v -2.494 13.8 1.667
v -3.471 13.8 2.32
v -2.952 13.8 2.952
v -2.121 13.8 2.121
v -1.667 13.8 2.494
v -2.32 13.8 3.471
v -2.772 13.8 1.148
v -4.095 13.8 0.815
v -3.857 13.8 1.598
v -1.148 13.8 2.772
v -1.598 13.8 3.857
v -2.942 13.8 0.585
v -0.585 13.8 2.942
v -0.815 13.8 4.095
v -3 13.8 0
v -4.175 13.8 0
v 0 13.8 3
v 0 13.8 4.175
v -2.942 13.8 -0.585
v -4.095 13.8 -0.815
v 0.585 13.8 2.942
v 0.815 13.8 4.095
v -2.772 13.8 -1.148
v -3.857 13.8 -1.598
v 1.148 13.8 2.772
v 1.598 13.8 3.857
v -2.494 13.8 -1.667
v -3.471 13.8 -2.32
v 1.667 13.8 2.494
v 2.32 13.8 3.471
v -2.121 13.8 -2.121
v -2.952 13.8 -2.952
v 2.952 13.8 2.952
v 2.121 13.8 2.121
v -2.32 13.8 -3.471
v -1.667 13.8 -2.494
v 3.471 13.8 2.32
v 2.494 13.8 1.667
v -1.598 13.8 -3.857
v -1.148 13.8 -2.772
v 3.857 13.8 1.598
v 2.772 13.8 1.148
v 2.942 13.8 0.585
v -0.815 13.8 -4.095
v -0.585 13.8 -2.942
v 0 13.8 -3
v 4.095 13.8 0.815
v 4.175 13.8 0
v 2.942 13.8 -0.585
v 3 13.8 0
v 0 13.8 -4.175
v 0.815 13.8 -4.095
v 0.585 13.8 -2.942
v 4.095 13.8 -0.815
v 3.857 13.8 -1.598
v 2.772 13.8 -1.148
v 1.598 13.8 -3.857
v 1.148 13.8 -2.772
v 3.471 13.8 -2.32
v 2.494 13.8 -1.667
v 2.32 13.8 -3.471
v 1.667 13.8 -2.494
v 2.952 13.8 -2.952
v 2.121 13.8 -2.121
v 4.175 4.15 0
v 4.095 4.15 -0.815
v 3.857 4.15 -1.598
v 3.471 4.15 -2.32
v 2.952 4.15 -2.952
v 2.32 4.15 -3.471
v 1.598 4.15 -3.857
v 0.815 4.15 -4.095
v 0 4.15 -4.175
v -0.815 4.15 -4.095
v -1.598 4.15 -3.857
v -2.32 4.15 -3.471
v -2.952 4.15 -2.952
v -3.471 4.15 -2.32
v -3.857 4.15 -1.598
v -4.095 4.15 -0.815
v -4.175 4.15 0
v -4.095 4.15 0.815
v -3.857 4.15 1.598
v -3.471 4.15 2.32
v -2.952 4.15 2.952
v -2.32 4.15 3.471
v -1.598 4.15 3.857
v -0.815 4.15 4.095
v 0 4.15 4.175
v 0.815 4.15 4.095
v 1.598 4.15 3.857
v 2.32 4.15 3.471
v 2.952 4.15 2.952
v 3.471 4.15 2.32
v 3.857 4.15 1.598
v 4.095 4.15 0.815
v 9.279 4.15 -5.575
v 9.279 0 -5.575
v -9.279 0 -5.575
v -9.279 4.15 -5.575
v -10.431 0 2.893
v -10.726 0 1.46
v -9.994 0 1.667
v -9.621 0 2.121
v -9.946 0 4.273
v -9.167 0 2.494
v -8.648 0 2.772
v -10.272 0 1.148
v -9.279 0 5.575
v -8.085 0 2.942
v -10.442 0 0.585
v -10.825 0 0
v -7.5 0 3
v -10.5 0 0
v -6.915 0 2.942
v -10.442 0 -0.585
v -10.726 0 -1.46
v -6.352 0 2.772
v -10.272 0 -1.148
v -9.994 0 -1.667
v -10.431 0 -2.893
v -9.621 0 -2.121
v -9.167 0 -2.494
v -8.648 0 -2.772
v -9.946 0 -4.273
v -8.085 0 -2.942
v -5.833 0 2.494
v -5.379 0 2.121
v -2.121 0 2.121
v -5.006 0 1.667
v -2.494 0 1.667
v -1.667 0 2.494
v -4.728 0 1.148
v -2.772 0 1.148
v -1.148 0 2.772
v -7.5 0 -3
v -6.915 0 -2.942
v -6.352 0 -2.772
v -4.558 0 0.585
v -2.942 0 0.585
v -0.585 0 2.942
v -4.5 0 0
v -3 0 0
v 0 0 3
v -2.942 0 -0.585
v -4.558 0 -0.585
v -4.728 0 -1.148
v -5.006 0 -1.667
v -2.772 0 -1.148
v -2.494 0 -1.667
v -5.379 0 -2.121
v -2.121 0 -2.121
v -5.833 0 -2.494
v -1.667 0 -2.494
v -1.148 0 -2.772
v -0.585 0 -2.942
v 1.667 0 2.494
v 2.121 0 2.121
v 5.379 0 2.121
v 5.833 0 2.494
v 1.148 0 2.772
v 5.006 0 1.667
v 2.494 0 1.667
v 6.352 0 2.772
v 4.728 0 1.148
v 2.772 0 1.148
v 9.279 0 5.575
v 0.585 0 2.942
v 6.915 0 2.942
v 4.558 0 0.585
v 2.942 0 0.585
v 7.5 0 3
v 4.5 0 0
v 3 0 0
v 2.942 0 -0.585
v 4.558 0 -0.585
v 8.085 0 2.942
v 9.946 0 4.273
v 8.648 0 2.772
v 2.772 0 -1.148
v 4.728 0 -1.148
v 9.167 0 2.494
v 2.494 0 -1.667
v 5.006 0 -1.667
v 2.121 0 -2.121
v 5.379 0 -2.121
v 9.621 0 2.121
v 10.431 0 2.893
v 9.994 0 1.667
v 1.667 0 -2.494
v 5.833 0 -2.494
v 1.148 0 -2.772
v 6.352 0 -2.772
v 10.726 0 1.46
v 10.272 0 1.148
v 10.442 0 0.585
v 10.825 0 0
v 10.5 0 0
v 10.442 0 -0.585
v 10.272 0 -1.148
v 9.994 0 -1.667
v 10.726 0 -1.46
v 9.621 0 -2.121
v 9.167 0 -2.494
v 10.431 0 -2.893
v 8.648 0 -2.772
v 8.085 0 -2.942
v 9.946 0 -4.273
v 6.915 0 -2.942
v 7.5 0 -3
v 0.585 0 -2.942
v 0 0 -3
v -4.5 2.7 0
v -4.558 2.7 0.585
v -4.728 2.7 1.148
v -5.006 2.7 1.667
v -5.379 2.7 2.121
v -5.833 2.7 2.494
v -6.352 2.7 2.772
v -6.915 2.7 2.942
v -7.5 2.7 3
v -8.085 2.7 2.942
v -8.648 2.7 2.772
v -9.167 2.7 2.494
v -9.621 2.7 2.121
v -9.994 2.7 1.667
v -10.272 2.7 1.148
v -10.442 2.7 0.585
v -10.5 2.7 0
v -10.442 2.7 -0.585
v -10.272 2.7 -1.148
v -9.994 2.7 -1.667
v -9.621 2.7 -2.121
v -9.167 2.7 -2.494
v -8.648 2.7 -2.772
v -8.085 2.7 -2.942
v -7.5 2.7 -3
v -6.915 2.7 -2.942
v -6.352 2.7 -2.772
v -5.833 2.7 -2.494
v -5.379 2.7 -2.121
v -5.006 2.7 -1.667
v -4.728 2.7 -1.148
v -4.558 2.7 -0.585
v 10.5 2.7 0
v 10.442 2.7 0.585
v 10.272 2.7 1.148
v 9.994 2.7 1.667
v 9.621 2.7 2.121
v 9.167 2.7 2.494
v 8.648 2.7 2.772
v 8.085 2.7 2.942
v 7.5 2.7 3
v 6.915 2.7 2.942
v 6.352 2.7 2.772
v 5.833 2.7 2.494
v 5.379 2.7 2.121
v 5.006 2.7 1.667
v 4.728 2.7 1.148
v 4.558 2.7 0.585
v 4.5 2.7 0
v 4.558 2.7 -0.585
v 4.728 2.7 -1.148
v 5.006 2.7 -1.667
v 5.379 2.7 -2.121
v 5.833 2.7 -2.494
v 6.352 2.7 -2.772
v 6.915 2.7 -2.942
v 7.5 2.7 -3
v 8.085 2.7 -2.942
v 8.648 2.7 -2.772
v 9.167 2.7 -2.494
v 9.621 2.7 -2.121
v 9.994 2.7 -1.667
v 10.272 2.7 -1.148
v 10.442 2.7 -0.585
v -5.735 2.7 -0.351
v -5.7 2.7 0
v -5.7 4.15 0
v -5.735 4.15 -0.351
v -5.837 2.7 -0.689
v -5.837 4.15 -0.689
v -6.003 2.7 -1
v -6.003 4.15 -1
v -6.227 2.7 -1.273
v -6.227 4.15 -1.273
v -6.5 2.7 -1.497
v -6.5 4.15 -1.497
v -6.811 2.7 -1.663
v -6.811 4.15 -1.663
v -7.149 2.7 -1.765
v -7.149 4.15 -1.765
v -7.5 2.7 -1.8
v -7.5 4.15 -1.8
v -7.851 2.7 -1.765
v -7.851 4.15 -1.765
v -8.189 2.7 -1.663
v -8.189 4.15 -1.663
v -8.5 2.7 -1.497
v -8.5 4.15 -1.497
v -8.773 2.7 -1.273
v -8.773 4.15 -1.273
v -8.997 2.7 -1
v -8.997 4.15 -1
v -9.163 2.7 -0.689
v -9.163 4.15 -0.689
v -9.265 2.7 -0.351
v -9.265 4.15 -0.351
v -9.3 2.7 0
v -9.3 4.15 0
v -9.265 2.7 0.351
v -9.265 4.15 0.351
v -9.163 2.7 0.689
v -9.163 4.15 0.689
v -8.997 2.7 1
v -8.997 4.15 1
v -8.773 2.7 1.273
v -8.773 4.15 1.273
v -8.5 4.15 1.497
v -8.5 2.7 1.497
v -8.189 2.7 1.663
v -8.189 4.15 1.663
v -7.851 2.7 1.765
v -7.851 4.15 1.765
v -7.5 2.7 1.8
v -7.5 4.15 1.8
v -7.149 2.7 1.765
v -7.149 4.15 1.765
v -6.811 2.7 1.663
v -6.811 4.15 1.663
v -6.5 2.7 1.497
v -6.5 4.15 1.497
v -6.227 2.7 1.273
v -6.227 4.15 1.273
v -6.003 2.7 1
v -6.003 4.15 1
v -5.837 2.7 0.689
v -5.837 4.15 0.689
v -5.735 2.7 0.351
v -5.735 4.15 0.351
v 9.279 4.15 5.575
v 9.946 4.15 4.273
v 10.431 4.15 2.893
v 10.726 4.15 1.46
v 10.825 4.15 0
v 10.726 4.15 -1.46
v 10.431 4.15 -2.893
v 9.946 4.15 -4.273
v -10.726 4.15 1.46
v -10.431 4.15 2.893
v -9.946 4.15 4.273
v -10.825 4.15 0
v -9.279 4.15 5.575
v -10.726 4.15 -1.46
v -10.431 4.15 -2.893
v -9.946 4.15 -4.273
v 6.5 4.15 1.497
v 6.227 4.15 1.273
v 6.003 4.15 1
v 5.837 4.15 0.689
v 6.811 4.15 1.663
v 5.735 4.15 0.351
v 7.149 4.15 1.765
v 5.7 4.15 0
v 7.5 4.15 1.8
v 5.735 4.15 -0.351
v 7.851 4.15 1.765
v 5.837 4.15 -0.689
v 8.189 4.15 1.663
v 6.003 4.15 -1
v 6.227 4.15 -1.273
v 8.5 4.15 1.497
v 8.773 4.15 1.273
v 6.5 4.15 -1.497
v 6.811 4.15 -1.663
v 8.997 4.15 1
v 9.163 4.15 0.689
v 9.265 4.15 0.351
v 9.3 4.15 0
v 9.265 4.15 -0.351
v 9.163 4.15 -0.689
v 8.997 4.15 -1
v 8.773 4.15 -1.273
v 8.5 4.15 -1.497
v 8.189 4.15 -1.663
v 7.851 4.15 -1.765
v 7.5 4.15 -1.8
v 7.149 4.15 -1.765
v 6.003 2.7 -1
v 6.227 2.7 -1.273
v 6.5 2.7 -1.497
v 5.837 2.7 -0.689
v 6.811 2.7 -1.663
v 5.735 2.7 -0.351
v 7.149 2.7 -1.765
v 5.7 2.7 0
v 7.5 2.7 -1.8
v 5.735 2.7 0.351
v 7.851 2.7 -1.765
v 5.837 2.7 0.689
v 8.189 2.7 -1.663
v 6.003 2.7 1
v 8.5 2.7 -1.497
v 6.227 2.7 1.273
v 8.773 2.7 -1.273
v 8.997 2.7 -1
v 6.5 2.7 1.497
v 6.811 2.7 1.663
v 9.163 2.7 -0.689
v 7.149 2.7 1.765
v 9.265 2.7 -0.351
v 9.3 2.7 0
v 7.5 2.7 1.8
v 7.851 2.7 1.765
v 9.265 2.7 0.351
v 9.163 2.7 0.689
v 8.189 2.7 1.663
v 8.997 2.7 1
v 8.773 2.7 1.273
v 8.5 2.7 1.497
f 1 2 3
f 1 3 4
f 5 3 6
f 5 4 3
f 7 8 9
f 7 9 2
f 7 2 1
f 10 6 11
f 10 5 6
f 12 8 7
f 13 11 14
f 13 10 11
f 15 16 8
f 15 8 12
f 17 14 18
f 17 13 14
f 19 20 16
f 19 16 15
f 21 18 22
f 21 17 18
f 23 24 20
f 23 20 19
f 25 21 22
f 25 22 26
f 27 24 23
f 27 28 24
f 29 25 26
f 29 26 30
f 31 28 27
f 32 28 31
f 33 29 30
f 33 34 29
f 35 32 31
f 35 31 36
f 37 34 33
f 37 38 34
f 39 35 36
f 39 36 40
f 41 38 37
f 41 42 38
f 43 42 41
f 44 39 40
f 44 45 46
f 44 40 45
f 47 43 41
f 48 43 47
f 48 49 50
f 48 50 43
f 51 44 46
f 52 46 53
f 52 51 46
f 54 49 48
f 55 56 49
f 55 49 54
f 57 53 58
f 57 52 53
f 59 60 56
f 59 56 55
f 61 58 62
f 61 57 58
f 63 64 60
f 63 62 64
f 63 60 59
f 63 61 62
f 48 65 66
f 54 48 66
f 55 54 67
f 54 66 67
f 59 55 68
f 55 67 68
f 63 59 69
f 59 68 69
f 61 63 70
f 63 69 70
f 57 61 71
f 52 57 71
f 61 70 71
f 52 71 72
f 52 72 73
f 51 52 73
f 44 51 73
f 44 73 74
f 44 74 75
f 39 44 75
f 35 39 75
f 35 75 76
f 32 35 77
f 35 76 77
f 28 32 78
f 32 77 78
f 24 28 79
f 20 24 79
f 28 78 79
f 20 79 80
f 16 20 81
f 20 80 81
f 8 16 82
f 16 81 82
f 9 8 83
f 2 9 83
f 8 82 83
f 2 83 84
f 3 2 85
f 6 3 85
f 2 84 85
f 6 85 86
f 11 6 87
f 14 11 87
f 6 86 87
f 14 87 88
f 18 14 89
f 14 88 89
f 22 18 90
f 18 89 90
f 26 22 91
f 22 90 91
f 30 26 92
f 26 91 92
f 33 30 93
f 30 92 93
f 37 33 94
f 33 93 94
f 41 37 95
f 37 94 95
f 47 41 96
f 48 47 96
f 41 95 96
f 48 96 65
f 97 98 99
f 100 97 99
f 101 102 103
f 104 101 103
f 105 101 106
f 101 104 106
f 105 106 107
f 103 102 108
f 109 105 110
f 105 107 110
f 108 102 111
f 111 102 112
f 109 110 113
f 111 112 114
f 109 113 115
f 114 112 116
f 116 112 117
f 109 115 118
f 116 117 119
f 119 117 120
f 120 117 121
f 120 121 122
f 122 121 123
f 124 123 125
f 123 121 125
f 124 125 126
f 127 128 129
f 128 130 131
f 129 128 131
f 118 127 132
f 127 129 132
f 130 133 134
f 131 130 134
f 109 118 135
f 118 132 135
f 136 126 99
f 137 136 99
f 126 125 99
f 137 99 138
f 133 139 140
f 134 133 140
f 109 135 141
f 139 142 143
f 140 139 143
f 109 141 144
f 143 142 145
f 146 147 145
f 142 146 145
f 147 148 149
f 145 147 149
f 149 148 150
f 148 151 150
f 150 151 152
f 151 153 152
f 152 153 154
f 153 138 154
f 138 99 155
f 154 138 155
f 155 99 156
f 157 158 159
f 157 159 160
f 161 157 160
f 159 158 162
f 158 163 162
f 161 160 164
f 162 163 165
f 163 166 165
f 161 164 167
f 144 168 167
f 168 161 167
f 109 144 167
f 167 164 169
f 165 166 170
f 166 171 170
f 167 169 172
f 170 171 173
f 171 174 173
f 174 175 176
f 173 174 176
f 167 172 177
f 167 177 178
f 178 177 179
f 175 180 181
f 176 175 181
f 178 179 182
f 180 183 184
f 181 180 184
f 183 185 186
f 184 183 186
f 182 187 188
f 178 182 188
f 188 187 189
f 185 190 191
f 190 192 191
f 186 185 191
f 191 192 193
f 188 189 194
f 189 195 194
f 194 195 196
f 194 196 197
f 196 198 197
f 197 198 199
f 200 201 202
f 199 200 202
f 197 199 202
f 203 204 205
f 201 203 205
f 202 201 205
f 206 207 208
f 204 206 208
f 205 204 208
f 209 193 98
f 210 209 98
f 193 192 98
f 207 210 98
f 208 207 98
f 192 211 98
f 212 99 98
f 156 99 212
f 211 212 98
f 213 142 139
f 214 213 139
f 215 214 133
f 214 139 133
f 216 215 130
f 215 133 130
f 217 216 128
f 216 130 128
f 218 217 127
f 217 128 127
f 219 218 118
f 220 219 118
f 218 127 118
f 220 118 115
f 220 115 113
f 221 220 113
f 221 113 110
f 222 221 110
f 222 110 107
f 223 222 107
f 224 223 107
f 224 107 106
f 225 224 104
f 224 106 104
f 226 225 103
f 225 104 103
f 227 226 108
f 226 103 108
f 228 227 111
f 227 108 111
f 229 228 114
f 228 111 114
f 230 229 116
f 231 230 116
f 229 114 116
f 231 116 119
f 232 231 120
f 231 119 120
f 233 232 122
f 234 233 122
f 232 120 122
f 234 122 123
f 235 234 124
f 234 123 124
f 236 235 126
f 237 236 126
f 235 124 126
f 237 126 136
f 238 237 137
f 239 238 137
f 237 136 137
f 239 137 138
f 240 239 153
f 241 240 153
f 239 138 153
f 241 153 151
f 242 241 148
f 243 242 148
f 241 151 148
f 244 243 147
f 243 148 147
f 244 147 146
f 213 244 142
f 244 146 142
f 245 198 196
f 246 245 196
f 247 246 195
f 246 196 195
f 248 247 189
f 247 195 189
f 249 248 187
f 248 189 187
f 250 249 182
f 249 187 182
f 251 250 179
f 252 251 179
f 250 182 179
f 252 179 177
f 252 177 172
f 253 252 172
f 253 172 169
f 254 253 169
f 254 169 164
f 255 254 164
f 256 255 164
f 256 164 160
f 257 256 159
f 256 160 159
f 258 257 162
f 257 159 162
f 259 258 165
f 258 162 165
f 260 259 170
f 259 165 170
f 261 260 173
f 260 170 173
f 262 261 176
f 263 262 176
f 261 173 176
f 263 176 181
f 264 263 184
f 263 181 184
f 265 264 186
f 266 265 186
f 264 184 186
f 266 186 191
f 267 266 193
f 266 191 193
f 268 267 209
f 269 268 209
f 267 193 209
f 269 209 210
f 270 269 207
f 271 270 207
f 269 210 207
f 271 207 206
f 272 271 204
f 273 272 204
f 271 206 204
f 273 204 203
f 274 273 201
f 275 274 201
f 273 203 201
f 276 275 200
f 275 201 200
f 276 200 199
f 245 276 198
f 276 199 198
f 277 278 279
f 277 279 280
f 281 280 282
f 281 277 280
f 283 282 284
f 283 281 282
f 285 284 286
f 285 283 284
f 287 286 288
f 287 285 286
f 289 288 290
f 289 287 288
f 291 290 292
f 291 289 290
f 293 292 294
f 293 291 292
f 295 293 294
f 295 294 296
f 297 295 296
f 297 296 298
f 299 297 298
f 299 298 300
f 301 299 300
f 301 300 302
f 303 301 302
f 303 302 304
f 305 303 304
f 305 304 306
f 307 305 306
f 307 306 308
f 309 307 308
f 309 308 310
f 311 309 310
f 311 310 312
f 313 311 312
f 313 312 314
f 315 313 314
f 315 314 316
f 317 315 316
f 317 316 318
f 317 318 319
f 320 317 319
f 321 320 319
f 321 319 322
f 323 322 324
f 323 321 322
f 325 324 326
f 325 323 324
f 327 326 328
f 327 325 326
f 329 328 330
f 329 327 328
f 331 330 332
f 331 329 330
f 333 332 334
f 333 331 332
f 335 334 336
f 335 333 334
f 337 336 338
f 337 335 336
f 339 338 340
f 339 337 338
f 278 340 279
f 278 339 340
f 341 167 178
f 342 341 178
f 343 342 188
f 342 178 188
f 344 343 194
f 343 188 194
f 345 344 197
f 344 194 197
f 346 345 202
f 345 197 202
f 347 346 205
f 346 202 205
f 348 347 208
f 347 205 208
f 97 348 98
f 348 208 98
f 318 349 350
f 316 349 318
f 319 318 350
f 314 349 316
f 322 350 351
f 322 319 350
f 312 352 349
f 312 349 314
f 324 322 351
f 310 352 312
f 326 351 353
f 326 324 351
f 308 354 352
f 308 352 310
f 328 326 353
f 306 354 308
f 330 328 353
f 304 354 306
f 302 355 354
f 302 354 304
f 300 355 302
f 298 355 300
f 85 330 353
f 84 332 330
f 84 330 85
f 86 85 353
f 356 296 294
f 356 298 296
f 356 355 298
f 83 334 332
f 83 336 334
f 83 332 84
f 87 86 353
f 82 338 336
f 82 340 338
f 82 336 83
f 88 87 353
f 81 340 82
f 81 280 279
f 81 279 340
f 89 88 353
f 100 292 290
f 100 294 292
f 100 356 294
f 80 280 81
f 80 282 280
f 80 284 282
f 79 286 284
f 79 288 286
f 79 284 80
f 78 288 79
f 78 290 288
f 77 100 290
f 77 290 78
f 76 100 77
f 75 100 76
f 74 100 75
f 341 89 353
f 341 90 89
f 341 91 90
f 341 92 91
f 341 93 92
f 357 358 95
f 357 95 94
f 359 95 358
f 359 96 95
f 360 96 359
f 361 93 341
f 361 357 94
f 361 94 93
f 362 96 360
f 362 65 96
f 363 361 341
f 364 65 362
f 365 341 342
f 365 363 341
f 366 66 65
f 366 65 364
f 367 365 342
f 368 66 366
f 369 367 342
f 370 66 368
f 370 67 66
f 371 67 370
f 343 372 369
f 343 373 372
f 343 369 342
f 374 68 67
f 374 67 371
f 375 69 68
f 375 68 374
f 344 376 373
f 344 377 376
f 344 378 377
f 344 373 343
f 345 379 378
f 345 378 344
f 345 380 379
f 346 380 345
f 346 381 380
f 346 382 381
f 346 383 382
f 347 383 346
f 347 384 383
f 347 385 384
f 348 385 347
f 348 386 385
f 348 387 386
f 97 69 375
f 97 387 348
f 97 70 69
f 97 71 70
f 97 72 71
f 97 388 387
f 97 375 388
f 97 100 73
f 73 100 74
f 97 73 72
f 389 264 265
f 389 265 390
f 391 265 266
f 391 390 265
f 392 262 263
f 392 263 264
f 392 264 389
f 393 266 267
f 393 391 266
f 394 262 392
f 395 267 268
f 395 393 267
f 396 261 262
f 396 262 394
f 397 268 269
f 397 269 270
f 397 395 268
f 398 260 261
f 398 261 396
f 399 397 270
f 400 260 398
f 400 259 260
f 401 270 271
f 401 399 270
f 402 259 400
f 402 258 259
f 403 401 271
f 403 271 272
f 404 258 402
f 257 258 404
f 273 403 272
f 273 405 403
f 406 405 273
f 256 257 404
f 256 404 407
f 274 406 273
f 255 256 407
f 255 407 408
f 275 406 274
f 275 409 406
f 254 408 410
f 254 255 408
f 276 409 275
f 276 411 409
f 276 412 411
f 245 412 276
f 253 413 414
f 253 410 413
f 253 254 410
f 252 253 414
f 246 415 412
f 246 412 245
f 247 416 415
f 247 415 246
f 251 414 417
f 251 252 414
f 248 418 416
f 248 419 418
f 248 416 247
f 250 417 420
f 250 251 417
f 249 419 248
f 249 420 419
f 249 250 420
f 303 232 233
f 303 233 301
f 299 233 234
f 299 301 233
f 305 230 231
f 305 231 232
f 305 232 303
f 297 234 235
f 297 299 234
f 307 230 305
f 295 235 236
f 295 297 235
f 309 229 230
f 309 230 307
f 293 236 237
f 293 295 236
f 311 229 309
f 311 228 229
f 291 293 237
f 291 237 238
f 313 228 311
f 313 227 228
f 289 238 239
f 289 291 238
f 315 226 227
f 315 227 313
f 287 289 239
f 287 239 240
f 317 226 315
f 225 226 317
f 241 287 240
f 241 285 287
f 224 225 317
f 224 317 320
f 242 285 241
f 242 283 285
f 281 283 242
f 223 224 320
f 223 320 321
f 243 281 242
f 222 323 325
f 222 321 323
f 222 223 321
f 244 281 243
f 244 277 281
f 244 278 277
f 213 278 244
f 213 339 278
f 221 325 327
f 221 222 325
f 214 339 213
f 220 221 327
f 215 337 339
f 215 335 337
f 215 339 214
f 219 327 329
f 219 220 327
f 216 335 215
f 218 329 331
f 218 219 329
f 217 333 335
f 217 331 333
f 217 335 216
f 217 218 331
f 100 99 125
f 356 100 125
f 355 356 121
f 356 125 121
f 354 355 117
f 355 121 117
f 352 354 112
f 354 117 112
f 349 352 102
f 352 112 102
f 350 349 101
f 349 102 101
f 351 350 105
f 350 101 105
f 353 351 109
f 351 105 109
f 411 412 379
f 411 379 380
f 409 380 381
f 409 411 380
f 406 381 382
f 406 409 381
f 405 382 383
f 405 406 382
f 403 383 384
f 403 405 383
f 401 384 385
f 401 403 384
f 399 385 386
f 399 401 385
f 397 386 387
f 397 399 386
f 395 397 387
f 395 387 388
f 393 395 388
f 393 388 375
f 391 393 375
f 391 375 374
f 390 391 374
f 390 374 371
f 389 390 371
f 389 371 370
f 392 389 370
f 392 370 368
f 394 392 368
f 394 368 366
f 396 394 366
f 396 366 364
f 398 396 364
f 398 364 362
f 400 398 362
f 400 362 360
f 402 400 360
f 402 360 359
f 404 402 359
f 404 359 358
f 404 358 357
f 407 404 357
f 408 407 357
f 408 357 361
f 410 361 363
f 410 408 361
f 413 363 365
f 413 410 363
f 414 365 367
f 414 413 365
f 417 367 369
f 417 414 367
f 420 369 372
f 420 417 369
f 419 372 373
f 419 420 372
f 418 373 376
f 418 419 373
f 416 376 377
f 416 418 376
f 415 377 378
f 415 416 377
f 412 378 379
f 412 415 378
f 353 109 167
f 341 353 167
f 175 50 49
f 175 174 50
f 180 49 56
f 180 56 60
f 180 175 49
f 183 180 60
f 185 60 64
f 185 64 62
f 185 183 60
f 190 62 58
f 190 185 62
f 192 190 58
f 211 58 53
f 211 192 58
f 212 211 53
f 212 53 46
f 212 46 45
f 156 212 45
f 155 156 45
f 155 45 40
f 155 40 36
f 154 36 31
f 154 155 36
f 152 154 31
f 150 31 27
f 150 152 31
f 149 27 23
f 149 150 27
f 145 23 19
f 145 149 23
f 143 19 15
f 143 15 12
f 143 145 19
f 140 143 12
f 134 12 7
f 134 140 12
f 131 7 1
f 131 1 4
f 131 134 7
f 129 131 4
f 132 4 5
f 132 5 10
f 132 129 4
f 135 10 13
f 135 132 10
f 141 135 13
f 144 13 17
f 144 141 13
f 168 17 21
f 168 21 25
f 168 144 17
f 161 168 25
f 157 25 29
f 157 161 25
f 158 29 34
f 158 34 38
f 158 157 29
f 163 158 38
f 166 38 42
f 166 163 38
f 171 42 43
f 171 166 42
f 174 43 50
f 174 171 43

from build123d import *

# Parameters (mm, degrees)
SKETCH1_R           = 1.8
SKETCH1_R_2         = 3
BOSS_EXTRUDE1_DEPTH = 4.15
SKETCH2_R           = 4.175
SKETCH2_R_2         = 3
BOSS_EXTRUDE2_DEPTH = 9.65
SKETCH3_R           = 3
CUT_EXTRUDE1_DEPTH  = 2.7


with BuildPart() as part:
    # Sketch1 → Boss-Extrude1 (new body)
    with BuildSketch(Plane(origin=(0, 0, 0), x_dir=(1, 0, 0), z_dir=(0, 1, 0))):
        with BuildLine():
            Line((-9.279008568, -5.575), (9.279008568, -5.575))
            ThreePointArc((9.279008568, -5.575), (10.825, 0), (9.279008568, 5.575))
            Line((9.279008568, 5.575), (-9.279008568, 5.575))
            ThreePointArc((-9.279008568, 5.575), (-10.825, 0), (-9.279008568, -5.575))
        make_face()
        with Locations((-7.5, 0)):
            Circle(SKETCH1_R, mode=Mode.SUBTRACT)
        with Locations((7.5, 0)):
            Circle(SKETCH1_R, mode=Mode.SUBTRACT)
        Circle(SKETCH1_R_2, mode=Mode.SUBTRACT)
    extrude(amount=BOSS_EXTRUDE1_DEPTH)

    # Sketch2 → Boss-Extrude2 (add)
    with BuildSketch(Plane(origin=(0, 4.15, 0), x_dir=(1, 0, 0), z_dir=(0, 1, 0))):
        Circle(SKETCH2_R)
        Circle(SKETCH2_R_2, mode=Mode.SUBTRACT)
    extrude(amount=BOSS_EXTRUDE2_DEPTH)

    # Sketch3 → Cut-Extrude1 (cut)
    with BuildSketch(Plane.XZ):
        with Locations((7.5, 0)):
            Circle(SKETCH3_R)
        with Locations((-7.5, 0)):
            Circle(SKETCH3_R)
    extrude(amount=-CUT_EXTRUDE1_DEPTH, mode=Mode.SUBTRACT)


solid = part.part
